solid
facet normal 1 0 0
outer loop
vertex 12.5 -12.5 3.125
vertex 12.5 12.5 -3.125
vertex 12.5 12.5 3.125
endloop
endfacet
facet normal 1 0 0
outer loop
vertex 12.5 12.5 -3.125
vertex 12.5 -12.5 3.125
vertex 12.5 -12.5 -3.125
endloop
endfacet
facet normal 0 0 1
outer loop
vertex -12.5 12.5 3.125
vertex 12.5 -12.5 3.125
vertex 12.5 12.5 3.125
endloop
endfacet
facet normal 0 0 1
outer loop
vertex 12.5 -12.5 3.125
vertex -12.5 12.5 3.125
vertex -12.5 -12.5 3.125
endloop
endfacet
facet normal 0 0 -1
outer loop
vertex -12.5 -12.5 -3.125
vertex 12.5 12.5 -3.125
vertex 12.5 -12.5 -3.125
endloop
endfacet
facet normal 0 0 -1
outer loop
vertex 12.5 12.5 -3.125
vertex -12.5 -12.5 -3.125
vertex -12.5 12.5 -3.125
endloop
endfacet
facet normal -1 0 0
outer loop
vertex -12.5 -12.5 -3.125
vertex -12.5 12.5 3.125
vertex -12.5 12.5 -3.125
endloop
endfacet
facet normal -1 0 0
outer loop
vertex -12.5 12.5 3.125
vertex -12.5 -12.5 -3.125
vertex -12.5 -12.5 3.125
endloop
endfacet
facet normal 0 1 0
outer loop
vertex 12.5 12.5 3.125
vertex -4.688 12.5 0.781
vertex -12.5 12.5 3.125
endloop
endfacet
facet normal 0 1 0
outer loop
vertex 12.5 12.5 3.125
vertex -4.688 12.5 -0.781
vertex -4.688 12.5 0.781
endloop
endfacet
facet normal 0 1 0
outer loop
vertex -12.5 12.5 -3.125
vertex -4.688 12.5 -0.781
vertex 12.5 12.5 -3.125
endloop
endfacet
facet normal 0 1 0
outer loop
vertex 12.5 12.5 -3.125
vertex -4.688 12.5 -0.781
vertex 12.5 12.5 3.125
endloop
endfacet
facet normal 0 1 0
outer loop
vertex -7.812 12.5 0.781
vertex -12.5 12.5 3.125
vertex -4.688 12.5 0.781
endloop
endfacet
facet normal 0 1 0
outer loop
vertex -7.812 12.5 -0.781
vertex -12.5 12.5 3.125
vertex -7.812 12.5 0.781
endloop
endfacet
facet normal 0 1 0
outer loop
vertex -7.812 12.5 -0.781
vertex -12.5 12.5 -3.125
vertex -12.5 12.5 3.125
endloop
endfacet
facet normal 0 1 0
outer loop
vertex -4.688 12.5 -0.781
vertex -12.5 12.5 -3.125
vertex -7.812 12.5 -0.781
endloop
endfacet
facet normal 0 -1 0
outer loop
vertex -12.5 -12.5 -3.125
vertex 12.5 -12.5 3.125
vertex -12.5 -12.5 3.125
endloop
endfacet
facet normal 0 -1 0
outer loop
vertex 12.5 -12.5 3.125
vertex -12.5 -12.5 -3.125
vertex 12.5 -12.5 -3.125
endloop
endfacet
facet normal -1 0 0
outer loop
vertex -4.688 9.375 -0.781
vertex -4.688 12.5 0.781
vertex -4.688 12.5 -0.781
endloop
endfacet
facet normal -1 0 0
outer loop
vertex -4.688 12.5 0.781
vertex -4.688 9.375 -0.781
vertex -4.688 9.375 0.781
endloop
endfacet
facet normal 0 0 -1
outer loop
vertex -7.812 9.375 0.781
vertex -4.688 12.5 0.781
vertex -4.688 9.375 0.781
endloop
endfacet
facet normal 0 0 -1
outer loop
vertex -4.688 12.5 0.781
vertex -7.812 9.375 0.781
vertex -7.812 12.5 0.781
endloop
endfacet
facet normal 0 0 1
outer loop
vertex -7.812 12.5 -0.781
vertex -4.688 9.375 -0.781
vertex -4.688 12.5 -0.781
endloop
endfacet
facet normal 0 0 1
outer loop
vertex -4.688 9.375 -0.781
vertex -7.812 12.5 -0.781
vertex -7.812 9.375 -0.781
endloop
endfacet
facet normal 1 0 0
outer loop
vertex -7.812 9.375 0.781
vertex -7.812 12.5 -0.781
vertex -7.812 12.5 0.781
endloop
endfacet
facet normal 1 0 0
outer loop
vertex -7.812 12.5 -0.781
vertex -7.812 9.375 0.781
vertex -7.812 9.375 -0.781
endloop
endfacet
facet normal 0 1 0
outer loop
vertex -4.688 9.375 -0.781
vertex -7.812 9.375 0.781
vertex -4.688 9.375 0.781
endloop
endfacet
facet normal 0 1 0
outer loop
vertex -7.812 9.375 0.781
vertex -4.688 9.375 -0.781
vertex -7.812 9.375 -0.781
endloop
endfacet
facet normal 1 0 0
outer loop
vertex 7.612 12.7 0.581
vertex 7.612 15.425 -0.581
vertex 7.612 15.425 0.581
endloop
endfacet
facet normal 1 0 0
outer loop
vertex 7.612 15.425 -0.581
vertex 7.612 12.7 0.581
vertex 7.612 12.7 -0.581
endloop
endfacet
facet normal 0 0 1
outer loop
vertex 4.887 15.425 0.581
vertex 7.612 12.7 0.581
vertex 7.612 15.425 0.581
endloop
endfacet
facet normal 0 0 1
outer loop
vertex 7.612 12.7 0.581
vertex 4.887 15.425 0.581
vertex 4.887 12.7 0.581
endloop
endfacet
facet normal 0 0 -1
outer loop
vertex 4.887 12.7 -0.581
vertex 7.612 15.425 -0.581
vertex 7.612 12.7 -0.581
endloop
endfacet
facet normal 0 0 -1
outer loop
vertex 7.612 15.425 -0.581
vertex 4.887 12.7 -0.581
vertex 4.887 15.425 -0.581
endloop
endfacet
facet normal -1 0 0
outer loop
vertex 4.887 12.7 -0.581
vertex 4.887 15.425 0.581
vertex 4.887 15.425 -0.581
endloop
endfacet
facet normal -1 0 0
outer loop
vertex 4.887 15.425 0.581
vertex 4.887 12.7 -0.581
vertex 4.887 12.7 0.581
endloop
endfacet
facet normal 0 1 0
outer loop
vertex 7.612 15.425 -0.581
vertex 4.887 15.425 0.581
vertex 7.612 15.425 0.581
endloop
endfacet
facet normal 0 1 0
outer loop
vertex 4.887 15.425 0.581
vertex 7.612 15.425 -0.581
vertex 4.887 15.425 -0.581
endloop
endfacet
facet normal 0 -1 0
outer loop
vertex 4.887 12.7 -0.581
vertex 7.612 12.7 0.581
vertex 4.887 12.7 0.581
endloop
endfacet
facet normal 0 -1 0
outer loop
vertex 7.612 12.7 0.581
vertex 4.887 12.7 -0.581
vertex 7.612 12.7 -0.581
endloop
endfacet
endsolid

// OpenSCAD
layerHeight = 0.2;
scale = 0.25;

blockWidth = 100 * scale;
blockDepth = 100 * scale;
blockHeight = 25 * scale;

connectorWidth = blockWidth / 2 * scale;
connectorDepth = blockDepth / 2 * scale;
connectorHeight = blockHeight * scale;

thickness = 5;
tolerance = layerHeight * 2;

difference([]) {
    cube([blockWidth, blockDepth, blockHeight], center = true);
    
    translate([-(blockWidth / 4), (blockDepth / 2) - (connectorDepth / 2), 0]) {
        cube([connectorWidth, connectorDepth, connectorHeight], center = true);
    }
}
translate([(blockWidth / 4), (blockDepth / 2) + (connectorDepth / 2), 0]) {
    cube([connectorWidth - tolerance, connectorDepth - tolerance, connectorHeight - tolerance], center = true);
}
